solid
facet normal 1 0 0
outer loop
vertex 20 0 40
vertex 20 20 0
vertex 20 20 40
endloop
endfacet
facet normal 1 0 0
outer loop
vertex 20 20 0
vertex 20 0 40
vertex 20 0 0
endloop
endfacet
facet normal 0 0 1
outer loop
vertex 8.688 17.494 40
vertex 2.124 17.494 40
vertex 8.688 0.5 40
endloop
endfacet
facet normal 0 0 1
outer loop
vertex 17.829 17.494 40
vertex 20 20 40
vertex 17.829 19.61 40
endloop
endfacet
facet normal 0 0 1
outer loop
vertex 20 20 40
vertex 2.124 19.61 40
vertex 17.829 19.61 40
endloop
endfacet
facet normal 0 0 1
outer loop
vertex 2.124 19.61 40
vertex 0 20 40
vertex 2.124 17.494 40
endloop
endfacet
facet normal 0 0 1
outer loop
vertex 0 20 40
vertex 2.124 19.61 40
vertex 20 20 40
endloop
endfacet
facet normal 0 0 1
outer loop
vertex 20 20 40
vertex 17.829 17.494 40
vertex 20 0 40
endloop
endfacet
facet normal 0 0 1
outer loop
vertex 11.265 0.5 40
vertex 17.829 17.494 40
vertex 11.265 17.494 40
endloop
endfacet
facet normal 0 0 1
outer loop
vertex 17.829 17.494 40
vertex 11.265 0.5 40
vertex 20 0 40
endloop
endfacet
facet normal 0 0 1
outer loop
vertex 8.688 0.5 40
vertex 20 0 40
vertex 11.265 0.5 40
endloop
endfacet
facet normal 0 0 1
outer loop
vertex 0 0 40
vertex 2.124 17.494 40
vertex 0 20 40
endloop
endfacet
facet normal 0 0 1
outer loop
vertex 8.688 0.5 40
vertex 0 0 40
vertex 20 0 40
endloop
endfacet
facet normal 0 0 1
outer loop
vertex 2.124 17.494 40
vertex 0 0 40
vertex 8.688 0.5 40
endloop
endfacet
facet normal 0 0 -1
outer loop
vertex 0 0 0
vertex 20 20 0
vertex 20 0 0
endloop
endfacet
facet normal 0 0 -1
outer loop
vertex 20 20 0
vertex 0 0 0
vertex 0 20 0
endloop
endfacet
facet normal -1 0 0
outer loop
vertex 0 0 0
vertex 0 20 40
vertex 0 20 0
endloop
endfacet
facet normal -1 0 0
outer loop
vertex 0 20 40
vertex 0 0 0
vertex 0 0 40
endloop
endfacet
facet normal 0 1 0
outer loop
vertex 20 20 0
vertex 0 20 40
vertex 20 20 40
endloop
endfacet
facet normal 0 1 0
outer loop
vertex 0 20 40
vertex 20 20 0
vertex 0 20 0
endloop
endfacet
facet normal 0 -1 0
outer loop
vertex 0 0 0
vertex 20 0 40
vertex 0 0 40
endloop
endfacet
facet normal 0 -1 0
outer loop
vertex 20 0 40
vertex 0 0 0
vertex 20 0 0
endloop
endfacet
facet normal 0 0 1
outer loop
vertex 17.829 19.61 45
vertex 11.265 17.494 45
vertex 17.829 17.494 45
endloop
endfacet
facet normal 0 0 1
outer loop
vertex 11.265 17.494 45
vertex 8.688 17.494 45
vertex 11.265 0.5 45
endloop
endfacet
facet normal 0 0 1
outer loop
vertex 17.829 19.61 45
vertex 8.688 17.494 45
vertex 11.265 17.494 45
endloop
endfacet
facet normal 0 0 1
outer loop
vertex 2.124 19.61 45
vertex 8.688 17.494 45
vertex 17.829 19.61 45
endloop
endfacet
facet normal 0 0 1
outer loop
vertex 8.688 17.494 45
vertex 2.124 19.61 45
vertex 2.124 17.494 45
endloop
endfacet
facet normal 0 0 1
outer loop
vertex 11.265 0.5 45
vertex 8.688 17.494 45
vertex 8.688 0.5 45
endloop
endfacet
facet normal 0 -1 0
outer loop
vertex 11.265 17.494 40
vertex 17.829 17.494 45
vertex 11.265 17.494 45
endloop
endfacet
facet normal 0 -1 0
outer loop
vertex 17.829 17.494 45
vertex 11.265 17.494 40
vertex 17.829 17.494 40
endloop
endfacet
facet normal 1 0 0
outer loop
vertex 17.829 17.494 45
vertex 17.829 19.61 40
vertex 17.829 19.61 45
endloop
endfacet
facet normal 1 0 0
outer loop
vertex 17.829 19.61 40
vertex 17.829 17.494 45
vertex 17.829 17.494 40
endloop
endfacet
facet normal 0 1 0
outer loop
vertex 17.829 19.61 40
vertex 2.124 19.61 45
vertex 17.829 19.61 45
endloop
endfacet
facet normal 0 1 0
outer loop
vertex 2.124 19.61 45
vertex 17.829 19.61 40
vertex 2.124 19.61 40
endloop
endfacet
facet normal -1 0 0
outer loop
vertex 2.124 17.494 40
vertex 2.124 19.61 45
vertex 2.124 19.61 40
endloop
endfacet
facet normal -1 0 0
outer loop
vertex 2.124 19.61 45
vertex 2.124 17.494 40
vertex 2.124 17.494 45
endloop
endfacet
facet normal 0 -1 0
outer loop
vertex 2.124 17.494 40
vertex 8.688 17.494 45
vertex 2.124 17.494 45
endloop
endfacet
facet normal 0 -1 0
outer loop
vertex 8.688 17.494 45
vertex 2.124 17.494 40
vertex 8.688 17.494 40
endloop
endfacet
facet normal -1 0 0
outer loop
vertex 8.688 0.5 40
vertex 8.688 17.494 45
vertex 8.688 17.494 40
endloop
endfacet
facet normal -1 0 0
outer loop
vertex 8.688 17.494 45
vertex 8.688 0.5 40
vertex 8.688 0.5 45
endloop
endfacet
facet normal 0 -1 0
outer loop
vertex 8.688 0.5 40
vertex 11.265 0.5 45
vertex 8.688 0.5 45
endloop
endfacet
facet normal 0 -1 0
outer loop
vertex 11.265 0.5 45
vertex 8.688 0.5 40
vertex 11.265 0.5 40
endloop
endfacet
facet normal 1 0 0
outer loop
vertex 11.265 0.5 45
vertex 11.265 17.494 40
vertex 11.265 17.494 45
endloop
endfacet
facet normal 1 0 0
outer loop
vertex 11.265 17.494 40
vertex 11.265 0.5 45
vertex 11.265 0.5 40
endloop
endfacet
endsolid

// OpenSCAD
cube([20, 20, 40]);
translate([1.5, 0.5, 40]){
    linear_extrude(5){
        text("T", size=20);
    }
}
